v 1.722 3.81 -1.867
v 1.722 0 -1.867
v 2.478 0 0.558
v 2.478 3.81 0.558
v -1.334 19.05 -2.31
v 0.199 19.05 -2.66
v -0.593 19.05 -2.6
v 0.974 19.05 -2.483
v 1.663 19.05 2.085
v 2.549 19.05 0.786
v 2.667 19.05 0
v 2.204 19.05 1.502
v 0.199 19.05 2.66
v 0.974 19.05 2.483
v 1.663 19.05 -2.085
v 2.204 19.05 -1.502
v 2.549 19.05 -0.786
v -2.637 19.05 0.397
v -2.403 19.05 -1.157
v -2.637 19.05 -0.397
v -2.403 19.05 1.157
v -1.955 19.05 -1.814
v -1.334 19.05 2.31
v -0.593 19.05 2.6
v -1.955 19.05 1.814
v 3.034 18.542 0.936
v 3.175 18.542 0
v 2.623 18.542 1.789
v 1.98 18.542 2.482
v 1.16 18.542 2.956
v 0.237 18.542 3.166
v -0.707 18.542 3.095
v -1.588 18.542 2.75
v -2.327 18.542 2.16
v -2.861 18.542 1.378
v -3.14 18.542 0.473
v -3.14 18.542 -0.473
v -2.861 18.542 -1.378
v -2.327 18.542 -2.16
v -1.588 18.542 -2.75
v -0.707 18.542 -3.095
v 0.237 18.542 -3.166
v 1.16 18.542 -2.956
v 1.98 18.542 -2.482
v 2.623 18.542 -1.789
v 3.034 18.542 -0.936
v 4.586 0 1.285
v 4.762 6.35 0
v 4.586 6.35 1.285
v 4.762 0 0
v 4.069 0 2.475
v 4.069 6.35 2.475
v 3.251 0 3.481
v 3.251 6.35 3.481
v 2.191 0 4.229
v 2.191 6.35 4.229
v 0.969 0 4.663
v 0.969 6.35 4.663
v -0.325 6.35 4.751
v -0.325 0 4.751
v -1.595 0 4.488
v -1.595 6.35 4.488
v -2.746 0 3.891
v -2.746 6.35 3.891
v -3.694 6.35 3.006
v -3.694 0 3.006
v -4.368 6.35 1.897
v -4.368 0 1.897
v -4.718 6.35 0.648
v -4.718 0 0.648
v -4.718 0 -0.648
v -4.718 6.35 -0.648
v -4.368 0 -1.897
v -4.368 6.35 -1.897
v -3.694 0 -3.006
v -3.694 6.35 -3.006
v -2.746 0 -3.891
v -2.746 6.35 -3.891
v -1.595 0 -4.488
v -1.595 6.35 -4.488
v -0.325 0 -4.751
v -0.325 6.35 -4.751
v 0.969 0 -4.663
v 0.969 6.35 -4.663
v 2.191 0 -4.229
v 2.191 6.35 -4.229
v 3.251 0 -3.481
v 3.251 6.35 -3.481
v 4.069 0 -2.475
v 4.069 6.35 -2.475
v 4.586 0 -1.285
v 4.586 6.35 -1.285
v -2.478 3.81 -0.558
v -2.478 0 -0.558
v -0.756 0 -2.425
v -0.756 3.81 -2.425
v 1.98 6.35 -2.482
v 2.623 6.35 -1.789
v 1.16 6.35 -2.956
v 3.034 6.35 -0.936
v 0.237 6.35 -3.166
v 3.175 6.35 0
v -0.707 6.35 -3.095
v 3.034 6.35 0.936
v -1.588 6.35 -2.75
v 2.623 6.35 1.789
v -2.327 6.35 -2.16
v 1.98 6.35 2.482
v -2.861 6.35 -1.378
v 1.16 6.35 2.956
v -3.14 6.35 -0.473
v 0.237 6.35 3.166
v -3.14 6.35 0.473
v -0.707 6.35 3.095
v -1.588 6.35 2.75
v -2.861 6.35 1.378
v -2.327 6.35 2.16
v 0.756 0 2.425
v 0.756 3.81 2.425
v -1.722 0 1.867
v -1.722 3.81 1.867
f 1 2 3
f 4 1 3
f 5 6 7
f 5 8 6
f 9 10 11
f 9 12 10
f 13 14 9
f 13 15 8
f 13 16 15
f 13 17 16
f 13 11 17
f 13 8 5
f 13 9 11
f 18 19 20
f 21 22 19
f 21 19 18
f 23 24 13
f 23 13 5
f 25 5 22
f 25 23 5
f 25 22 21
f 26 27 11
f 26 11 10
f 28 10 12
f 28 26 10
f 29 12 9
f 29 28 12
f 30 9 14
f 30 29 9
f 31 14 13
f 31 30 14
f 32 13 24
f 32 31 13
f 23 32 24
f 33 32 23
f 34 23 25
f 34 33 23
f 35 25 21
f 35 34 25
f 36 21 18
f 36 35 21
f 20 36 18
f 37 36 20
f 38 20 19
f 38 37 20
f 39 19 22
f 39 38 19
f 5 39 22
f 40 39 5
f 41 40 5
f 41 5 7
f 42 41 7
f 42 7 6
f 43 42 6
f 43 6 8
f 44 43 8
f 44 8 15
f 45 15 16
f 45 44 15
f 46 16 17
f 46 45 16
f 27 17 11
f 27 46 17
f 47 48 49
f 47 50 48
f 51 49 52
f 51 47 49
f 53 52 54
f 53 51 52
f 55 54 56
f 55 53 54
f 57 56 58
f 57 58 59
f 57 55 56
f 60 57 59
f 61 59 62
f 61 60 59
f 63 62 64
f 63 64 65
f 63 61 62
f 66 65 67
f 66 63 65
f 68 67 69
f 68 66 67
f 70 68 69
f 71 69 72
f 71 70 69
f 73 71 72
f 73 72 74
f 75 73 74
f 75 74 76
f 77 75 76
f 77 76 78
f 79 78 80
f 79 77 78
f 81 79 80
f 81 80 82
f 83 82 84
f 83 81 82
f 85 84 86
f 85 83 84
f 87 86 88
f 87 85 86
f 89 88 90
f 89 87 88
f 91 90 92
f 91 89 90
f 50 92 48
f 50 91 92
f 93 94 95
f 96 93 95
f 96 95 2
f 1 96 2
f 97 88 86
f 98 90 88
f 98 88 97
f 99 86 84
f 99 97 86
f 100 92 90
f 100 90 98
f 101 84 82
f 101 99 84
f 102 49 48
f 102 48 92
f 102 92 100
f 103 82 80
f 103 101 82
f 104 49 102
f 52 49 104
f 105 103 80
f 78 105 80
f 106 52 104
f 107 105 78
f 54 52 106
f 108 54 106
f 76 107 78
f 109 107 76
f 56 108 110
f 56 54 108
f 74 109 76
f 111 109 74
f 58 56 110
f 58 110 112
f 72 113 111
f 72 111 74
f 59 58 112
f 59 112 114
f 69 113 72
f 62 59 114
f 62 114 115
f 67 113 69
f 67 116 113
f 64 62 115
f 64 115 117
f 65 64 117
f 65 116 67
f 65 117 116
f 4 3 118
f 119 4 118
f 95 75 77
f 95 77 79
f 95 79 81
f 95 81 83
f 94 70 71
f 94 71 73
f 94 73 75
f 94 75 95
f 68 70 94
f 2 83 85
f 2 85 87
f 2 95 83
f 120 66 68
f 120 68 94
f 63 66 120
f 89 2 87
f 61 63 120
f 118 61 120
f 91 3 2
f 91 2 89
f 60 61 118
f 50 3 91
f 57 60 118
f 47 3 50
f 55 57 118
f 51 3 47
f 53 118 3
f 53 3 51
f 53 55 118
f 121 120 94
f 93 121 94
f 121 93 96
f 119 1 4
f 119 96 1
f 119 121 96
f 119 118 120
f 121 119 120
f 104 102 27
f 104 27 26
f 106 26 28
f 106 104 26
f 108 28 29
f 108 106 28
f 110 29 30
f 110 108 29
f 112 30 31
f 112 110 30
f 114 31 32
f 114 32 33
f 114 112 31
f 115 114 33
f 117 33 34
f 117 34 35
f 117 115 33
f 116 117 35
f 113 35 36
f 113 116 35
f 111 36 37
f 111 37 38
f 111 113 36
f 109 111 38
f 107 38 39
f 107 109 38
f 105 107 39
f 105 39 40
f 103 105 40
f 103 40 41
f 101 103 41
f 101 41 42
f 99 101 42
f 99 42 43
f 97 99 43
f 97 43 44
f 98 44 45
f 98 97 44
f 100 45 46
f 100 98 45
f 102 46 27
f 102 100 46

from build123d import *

# Parameters (mm, degrees)
CHAMFER1_SIZE      = 0.508
CUT_EXTRUDE1_DEPTH = 3.81


with BuildPart() as part:
    # Sketch1 → Revolve1 (revolve)
    with BuildSketch(Plane.XY):
        Polygon((0, 0), (0, 19.05), (3.175, 19.05), (3.175, 6.35), (4.7625, 6.35), (4.7625, 0), align=None)
    revolve(axis=Axis((0, 19.05, 0), (0, -1, 0)))

    # Chamfer1
    chamfer1_edges = [part.edges().sort_by_distance(p)[0] for p in [
        (-3.175, 19.05, 0),
    ]]
    chamfer(chamfer1_edges, length=CHAMFER1_SIZE)

    # Sketch2 → Cut-Extrude1 (cut)
    with BuildSketch(Plane.XZ):
        Polygon((1.721936672, -1.867226311), (2.478033756, 0.557627746), (0.756097084, 2.424854057), (-1.721936672, 1.867226311), (-2.478033756, -0.557627746), (-0.756097084, -2.424854057), align=None)
    extrude(amount=-CUT_EXTRUDE1_DEPTH, mode=Mode.SUBTRACT)


solid = part.part
